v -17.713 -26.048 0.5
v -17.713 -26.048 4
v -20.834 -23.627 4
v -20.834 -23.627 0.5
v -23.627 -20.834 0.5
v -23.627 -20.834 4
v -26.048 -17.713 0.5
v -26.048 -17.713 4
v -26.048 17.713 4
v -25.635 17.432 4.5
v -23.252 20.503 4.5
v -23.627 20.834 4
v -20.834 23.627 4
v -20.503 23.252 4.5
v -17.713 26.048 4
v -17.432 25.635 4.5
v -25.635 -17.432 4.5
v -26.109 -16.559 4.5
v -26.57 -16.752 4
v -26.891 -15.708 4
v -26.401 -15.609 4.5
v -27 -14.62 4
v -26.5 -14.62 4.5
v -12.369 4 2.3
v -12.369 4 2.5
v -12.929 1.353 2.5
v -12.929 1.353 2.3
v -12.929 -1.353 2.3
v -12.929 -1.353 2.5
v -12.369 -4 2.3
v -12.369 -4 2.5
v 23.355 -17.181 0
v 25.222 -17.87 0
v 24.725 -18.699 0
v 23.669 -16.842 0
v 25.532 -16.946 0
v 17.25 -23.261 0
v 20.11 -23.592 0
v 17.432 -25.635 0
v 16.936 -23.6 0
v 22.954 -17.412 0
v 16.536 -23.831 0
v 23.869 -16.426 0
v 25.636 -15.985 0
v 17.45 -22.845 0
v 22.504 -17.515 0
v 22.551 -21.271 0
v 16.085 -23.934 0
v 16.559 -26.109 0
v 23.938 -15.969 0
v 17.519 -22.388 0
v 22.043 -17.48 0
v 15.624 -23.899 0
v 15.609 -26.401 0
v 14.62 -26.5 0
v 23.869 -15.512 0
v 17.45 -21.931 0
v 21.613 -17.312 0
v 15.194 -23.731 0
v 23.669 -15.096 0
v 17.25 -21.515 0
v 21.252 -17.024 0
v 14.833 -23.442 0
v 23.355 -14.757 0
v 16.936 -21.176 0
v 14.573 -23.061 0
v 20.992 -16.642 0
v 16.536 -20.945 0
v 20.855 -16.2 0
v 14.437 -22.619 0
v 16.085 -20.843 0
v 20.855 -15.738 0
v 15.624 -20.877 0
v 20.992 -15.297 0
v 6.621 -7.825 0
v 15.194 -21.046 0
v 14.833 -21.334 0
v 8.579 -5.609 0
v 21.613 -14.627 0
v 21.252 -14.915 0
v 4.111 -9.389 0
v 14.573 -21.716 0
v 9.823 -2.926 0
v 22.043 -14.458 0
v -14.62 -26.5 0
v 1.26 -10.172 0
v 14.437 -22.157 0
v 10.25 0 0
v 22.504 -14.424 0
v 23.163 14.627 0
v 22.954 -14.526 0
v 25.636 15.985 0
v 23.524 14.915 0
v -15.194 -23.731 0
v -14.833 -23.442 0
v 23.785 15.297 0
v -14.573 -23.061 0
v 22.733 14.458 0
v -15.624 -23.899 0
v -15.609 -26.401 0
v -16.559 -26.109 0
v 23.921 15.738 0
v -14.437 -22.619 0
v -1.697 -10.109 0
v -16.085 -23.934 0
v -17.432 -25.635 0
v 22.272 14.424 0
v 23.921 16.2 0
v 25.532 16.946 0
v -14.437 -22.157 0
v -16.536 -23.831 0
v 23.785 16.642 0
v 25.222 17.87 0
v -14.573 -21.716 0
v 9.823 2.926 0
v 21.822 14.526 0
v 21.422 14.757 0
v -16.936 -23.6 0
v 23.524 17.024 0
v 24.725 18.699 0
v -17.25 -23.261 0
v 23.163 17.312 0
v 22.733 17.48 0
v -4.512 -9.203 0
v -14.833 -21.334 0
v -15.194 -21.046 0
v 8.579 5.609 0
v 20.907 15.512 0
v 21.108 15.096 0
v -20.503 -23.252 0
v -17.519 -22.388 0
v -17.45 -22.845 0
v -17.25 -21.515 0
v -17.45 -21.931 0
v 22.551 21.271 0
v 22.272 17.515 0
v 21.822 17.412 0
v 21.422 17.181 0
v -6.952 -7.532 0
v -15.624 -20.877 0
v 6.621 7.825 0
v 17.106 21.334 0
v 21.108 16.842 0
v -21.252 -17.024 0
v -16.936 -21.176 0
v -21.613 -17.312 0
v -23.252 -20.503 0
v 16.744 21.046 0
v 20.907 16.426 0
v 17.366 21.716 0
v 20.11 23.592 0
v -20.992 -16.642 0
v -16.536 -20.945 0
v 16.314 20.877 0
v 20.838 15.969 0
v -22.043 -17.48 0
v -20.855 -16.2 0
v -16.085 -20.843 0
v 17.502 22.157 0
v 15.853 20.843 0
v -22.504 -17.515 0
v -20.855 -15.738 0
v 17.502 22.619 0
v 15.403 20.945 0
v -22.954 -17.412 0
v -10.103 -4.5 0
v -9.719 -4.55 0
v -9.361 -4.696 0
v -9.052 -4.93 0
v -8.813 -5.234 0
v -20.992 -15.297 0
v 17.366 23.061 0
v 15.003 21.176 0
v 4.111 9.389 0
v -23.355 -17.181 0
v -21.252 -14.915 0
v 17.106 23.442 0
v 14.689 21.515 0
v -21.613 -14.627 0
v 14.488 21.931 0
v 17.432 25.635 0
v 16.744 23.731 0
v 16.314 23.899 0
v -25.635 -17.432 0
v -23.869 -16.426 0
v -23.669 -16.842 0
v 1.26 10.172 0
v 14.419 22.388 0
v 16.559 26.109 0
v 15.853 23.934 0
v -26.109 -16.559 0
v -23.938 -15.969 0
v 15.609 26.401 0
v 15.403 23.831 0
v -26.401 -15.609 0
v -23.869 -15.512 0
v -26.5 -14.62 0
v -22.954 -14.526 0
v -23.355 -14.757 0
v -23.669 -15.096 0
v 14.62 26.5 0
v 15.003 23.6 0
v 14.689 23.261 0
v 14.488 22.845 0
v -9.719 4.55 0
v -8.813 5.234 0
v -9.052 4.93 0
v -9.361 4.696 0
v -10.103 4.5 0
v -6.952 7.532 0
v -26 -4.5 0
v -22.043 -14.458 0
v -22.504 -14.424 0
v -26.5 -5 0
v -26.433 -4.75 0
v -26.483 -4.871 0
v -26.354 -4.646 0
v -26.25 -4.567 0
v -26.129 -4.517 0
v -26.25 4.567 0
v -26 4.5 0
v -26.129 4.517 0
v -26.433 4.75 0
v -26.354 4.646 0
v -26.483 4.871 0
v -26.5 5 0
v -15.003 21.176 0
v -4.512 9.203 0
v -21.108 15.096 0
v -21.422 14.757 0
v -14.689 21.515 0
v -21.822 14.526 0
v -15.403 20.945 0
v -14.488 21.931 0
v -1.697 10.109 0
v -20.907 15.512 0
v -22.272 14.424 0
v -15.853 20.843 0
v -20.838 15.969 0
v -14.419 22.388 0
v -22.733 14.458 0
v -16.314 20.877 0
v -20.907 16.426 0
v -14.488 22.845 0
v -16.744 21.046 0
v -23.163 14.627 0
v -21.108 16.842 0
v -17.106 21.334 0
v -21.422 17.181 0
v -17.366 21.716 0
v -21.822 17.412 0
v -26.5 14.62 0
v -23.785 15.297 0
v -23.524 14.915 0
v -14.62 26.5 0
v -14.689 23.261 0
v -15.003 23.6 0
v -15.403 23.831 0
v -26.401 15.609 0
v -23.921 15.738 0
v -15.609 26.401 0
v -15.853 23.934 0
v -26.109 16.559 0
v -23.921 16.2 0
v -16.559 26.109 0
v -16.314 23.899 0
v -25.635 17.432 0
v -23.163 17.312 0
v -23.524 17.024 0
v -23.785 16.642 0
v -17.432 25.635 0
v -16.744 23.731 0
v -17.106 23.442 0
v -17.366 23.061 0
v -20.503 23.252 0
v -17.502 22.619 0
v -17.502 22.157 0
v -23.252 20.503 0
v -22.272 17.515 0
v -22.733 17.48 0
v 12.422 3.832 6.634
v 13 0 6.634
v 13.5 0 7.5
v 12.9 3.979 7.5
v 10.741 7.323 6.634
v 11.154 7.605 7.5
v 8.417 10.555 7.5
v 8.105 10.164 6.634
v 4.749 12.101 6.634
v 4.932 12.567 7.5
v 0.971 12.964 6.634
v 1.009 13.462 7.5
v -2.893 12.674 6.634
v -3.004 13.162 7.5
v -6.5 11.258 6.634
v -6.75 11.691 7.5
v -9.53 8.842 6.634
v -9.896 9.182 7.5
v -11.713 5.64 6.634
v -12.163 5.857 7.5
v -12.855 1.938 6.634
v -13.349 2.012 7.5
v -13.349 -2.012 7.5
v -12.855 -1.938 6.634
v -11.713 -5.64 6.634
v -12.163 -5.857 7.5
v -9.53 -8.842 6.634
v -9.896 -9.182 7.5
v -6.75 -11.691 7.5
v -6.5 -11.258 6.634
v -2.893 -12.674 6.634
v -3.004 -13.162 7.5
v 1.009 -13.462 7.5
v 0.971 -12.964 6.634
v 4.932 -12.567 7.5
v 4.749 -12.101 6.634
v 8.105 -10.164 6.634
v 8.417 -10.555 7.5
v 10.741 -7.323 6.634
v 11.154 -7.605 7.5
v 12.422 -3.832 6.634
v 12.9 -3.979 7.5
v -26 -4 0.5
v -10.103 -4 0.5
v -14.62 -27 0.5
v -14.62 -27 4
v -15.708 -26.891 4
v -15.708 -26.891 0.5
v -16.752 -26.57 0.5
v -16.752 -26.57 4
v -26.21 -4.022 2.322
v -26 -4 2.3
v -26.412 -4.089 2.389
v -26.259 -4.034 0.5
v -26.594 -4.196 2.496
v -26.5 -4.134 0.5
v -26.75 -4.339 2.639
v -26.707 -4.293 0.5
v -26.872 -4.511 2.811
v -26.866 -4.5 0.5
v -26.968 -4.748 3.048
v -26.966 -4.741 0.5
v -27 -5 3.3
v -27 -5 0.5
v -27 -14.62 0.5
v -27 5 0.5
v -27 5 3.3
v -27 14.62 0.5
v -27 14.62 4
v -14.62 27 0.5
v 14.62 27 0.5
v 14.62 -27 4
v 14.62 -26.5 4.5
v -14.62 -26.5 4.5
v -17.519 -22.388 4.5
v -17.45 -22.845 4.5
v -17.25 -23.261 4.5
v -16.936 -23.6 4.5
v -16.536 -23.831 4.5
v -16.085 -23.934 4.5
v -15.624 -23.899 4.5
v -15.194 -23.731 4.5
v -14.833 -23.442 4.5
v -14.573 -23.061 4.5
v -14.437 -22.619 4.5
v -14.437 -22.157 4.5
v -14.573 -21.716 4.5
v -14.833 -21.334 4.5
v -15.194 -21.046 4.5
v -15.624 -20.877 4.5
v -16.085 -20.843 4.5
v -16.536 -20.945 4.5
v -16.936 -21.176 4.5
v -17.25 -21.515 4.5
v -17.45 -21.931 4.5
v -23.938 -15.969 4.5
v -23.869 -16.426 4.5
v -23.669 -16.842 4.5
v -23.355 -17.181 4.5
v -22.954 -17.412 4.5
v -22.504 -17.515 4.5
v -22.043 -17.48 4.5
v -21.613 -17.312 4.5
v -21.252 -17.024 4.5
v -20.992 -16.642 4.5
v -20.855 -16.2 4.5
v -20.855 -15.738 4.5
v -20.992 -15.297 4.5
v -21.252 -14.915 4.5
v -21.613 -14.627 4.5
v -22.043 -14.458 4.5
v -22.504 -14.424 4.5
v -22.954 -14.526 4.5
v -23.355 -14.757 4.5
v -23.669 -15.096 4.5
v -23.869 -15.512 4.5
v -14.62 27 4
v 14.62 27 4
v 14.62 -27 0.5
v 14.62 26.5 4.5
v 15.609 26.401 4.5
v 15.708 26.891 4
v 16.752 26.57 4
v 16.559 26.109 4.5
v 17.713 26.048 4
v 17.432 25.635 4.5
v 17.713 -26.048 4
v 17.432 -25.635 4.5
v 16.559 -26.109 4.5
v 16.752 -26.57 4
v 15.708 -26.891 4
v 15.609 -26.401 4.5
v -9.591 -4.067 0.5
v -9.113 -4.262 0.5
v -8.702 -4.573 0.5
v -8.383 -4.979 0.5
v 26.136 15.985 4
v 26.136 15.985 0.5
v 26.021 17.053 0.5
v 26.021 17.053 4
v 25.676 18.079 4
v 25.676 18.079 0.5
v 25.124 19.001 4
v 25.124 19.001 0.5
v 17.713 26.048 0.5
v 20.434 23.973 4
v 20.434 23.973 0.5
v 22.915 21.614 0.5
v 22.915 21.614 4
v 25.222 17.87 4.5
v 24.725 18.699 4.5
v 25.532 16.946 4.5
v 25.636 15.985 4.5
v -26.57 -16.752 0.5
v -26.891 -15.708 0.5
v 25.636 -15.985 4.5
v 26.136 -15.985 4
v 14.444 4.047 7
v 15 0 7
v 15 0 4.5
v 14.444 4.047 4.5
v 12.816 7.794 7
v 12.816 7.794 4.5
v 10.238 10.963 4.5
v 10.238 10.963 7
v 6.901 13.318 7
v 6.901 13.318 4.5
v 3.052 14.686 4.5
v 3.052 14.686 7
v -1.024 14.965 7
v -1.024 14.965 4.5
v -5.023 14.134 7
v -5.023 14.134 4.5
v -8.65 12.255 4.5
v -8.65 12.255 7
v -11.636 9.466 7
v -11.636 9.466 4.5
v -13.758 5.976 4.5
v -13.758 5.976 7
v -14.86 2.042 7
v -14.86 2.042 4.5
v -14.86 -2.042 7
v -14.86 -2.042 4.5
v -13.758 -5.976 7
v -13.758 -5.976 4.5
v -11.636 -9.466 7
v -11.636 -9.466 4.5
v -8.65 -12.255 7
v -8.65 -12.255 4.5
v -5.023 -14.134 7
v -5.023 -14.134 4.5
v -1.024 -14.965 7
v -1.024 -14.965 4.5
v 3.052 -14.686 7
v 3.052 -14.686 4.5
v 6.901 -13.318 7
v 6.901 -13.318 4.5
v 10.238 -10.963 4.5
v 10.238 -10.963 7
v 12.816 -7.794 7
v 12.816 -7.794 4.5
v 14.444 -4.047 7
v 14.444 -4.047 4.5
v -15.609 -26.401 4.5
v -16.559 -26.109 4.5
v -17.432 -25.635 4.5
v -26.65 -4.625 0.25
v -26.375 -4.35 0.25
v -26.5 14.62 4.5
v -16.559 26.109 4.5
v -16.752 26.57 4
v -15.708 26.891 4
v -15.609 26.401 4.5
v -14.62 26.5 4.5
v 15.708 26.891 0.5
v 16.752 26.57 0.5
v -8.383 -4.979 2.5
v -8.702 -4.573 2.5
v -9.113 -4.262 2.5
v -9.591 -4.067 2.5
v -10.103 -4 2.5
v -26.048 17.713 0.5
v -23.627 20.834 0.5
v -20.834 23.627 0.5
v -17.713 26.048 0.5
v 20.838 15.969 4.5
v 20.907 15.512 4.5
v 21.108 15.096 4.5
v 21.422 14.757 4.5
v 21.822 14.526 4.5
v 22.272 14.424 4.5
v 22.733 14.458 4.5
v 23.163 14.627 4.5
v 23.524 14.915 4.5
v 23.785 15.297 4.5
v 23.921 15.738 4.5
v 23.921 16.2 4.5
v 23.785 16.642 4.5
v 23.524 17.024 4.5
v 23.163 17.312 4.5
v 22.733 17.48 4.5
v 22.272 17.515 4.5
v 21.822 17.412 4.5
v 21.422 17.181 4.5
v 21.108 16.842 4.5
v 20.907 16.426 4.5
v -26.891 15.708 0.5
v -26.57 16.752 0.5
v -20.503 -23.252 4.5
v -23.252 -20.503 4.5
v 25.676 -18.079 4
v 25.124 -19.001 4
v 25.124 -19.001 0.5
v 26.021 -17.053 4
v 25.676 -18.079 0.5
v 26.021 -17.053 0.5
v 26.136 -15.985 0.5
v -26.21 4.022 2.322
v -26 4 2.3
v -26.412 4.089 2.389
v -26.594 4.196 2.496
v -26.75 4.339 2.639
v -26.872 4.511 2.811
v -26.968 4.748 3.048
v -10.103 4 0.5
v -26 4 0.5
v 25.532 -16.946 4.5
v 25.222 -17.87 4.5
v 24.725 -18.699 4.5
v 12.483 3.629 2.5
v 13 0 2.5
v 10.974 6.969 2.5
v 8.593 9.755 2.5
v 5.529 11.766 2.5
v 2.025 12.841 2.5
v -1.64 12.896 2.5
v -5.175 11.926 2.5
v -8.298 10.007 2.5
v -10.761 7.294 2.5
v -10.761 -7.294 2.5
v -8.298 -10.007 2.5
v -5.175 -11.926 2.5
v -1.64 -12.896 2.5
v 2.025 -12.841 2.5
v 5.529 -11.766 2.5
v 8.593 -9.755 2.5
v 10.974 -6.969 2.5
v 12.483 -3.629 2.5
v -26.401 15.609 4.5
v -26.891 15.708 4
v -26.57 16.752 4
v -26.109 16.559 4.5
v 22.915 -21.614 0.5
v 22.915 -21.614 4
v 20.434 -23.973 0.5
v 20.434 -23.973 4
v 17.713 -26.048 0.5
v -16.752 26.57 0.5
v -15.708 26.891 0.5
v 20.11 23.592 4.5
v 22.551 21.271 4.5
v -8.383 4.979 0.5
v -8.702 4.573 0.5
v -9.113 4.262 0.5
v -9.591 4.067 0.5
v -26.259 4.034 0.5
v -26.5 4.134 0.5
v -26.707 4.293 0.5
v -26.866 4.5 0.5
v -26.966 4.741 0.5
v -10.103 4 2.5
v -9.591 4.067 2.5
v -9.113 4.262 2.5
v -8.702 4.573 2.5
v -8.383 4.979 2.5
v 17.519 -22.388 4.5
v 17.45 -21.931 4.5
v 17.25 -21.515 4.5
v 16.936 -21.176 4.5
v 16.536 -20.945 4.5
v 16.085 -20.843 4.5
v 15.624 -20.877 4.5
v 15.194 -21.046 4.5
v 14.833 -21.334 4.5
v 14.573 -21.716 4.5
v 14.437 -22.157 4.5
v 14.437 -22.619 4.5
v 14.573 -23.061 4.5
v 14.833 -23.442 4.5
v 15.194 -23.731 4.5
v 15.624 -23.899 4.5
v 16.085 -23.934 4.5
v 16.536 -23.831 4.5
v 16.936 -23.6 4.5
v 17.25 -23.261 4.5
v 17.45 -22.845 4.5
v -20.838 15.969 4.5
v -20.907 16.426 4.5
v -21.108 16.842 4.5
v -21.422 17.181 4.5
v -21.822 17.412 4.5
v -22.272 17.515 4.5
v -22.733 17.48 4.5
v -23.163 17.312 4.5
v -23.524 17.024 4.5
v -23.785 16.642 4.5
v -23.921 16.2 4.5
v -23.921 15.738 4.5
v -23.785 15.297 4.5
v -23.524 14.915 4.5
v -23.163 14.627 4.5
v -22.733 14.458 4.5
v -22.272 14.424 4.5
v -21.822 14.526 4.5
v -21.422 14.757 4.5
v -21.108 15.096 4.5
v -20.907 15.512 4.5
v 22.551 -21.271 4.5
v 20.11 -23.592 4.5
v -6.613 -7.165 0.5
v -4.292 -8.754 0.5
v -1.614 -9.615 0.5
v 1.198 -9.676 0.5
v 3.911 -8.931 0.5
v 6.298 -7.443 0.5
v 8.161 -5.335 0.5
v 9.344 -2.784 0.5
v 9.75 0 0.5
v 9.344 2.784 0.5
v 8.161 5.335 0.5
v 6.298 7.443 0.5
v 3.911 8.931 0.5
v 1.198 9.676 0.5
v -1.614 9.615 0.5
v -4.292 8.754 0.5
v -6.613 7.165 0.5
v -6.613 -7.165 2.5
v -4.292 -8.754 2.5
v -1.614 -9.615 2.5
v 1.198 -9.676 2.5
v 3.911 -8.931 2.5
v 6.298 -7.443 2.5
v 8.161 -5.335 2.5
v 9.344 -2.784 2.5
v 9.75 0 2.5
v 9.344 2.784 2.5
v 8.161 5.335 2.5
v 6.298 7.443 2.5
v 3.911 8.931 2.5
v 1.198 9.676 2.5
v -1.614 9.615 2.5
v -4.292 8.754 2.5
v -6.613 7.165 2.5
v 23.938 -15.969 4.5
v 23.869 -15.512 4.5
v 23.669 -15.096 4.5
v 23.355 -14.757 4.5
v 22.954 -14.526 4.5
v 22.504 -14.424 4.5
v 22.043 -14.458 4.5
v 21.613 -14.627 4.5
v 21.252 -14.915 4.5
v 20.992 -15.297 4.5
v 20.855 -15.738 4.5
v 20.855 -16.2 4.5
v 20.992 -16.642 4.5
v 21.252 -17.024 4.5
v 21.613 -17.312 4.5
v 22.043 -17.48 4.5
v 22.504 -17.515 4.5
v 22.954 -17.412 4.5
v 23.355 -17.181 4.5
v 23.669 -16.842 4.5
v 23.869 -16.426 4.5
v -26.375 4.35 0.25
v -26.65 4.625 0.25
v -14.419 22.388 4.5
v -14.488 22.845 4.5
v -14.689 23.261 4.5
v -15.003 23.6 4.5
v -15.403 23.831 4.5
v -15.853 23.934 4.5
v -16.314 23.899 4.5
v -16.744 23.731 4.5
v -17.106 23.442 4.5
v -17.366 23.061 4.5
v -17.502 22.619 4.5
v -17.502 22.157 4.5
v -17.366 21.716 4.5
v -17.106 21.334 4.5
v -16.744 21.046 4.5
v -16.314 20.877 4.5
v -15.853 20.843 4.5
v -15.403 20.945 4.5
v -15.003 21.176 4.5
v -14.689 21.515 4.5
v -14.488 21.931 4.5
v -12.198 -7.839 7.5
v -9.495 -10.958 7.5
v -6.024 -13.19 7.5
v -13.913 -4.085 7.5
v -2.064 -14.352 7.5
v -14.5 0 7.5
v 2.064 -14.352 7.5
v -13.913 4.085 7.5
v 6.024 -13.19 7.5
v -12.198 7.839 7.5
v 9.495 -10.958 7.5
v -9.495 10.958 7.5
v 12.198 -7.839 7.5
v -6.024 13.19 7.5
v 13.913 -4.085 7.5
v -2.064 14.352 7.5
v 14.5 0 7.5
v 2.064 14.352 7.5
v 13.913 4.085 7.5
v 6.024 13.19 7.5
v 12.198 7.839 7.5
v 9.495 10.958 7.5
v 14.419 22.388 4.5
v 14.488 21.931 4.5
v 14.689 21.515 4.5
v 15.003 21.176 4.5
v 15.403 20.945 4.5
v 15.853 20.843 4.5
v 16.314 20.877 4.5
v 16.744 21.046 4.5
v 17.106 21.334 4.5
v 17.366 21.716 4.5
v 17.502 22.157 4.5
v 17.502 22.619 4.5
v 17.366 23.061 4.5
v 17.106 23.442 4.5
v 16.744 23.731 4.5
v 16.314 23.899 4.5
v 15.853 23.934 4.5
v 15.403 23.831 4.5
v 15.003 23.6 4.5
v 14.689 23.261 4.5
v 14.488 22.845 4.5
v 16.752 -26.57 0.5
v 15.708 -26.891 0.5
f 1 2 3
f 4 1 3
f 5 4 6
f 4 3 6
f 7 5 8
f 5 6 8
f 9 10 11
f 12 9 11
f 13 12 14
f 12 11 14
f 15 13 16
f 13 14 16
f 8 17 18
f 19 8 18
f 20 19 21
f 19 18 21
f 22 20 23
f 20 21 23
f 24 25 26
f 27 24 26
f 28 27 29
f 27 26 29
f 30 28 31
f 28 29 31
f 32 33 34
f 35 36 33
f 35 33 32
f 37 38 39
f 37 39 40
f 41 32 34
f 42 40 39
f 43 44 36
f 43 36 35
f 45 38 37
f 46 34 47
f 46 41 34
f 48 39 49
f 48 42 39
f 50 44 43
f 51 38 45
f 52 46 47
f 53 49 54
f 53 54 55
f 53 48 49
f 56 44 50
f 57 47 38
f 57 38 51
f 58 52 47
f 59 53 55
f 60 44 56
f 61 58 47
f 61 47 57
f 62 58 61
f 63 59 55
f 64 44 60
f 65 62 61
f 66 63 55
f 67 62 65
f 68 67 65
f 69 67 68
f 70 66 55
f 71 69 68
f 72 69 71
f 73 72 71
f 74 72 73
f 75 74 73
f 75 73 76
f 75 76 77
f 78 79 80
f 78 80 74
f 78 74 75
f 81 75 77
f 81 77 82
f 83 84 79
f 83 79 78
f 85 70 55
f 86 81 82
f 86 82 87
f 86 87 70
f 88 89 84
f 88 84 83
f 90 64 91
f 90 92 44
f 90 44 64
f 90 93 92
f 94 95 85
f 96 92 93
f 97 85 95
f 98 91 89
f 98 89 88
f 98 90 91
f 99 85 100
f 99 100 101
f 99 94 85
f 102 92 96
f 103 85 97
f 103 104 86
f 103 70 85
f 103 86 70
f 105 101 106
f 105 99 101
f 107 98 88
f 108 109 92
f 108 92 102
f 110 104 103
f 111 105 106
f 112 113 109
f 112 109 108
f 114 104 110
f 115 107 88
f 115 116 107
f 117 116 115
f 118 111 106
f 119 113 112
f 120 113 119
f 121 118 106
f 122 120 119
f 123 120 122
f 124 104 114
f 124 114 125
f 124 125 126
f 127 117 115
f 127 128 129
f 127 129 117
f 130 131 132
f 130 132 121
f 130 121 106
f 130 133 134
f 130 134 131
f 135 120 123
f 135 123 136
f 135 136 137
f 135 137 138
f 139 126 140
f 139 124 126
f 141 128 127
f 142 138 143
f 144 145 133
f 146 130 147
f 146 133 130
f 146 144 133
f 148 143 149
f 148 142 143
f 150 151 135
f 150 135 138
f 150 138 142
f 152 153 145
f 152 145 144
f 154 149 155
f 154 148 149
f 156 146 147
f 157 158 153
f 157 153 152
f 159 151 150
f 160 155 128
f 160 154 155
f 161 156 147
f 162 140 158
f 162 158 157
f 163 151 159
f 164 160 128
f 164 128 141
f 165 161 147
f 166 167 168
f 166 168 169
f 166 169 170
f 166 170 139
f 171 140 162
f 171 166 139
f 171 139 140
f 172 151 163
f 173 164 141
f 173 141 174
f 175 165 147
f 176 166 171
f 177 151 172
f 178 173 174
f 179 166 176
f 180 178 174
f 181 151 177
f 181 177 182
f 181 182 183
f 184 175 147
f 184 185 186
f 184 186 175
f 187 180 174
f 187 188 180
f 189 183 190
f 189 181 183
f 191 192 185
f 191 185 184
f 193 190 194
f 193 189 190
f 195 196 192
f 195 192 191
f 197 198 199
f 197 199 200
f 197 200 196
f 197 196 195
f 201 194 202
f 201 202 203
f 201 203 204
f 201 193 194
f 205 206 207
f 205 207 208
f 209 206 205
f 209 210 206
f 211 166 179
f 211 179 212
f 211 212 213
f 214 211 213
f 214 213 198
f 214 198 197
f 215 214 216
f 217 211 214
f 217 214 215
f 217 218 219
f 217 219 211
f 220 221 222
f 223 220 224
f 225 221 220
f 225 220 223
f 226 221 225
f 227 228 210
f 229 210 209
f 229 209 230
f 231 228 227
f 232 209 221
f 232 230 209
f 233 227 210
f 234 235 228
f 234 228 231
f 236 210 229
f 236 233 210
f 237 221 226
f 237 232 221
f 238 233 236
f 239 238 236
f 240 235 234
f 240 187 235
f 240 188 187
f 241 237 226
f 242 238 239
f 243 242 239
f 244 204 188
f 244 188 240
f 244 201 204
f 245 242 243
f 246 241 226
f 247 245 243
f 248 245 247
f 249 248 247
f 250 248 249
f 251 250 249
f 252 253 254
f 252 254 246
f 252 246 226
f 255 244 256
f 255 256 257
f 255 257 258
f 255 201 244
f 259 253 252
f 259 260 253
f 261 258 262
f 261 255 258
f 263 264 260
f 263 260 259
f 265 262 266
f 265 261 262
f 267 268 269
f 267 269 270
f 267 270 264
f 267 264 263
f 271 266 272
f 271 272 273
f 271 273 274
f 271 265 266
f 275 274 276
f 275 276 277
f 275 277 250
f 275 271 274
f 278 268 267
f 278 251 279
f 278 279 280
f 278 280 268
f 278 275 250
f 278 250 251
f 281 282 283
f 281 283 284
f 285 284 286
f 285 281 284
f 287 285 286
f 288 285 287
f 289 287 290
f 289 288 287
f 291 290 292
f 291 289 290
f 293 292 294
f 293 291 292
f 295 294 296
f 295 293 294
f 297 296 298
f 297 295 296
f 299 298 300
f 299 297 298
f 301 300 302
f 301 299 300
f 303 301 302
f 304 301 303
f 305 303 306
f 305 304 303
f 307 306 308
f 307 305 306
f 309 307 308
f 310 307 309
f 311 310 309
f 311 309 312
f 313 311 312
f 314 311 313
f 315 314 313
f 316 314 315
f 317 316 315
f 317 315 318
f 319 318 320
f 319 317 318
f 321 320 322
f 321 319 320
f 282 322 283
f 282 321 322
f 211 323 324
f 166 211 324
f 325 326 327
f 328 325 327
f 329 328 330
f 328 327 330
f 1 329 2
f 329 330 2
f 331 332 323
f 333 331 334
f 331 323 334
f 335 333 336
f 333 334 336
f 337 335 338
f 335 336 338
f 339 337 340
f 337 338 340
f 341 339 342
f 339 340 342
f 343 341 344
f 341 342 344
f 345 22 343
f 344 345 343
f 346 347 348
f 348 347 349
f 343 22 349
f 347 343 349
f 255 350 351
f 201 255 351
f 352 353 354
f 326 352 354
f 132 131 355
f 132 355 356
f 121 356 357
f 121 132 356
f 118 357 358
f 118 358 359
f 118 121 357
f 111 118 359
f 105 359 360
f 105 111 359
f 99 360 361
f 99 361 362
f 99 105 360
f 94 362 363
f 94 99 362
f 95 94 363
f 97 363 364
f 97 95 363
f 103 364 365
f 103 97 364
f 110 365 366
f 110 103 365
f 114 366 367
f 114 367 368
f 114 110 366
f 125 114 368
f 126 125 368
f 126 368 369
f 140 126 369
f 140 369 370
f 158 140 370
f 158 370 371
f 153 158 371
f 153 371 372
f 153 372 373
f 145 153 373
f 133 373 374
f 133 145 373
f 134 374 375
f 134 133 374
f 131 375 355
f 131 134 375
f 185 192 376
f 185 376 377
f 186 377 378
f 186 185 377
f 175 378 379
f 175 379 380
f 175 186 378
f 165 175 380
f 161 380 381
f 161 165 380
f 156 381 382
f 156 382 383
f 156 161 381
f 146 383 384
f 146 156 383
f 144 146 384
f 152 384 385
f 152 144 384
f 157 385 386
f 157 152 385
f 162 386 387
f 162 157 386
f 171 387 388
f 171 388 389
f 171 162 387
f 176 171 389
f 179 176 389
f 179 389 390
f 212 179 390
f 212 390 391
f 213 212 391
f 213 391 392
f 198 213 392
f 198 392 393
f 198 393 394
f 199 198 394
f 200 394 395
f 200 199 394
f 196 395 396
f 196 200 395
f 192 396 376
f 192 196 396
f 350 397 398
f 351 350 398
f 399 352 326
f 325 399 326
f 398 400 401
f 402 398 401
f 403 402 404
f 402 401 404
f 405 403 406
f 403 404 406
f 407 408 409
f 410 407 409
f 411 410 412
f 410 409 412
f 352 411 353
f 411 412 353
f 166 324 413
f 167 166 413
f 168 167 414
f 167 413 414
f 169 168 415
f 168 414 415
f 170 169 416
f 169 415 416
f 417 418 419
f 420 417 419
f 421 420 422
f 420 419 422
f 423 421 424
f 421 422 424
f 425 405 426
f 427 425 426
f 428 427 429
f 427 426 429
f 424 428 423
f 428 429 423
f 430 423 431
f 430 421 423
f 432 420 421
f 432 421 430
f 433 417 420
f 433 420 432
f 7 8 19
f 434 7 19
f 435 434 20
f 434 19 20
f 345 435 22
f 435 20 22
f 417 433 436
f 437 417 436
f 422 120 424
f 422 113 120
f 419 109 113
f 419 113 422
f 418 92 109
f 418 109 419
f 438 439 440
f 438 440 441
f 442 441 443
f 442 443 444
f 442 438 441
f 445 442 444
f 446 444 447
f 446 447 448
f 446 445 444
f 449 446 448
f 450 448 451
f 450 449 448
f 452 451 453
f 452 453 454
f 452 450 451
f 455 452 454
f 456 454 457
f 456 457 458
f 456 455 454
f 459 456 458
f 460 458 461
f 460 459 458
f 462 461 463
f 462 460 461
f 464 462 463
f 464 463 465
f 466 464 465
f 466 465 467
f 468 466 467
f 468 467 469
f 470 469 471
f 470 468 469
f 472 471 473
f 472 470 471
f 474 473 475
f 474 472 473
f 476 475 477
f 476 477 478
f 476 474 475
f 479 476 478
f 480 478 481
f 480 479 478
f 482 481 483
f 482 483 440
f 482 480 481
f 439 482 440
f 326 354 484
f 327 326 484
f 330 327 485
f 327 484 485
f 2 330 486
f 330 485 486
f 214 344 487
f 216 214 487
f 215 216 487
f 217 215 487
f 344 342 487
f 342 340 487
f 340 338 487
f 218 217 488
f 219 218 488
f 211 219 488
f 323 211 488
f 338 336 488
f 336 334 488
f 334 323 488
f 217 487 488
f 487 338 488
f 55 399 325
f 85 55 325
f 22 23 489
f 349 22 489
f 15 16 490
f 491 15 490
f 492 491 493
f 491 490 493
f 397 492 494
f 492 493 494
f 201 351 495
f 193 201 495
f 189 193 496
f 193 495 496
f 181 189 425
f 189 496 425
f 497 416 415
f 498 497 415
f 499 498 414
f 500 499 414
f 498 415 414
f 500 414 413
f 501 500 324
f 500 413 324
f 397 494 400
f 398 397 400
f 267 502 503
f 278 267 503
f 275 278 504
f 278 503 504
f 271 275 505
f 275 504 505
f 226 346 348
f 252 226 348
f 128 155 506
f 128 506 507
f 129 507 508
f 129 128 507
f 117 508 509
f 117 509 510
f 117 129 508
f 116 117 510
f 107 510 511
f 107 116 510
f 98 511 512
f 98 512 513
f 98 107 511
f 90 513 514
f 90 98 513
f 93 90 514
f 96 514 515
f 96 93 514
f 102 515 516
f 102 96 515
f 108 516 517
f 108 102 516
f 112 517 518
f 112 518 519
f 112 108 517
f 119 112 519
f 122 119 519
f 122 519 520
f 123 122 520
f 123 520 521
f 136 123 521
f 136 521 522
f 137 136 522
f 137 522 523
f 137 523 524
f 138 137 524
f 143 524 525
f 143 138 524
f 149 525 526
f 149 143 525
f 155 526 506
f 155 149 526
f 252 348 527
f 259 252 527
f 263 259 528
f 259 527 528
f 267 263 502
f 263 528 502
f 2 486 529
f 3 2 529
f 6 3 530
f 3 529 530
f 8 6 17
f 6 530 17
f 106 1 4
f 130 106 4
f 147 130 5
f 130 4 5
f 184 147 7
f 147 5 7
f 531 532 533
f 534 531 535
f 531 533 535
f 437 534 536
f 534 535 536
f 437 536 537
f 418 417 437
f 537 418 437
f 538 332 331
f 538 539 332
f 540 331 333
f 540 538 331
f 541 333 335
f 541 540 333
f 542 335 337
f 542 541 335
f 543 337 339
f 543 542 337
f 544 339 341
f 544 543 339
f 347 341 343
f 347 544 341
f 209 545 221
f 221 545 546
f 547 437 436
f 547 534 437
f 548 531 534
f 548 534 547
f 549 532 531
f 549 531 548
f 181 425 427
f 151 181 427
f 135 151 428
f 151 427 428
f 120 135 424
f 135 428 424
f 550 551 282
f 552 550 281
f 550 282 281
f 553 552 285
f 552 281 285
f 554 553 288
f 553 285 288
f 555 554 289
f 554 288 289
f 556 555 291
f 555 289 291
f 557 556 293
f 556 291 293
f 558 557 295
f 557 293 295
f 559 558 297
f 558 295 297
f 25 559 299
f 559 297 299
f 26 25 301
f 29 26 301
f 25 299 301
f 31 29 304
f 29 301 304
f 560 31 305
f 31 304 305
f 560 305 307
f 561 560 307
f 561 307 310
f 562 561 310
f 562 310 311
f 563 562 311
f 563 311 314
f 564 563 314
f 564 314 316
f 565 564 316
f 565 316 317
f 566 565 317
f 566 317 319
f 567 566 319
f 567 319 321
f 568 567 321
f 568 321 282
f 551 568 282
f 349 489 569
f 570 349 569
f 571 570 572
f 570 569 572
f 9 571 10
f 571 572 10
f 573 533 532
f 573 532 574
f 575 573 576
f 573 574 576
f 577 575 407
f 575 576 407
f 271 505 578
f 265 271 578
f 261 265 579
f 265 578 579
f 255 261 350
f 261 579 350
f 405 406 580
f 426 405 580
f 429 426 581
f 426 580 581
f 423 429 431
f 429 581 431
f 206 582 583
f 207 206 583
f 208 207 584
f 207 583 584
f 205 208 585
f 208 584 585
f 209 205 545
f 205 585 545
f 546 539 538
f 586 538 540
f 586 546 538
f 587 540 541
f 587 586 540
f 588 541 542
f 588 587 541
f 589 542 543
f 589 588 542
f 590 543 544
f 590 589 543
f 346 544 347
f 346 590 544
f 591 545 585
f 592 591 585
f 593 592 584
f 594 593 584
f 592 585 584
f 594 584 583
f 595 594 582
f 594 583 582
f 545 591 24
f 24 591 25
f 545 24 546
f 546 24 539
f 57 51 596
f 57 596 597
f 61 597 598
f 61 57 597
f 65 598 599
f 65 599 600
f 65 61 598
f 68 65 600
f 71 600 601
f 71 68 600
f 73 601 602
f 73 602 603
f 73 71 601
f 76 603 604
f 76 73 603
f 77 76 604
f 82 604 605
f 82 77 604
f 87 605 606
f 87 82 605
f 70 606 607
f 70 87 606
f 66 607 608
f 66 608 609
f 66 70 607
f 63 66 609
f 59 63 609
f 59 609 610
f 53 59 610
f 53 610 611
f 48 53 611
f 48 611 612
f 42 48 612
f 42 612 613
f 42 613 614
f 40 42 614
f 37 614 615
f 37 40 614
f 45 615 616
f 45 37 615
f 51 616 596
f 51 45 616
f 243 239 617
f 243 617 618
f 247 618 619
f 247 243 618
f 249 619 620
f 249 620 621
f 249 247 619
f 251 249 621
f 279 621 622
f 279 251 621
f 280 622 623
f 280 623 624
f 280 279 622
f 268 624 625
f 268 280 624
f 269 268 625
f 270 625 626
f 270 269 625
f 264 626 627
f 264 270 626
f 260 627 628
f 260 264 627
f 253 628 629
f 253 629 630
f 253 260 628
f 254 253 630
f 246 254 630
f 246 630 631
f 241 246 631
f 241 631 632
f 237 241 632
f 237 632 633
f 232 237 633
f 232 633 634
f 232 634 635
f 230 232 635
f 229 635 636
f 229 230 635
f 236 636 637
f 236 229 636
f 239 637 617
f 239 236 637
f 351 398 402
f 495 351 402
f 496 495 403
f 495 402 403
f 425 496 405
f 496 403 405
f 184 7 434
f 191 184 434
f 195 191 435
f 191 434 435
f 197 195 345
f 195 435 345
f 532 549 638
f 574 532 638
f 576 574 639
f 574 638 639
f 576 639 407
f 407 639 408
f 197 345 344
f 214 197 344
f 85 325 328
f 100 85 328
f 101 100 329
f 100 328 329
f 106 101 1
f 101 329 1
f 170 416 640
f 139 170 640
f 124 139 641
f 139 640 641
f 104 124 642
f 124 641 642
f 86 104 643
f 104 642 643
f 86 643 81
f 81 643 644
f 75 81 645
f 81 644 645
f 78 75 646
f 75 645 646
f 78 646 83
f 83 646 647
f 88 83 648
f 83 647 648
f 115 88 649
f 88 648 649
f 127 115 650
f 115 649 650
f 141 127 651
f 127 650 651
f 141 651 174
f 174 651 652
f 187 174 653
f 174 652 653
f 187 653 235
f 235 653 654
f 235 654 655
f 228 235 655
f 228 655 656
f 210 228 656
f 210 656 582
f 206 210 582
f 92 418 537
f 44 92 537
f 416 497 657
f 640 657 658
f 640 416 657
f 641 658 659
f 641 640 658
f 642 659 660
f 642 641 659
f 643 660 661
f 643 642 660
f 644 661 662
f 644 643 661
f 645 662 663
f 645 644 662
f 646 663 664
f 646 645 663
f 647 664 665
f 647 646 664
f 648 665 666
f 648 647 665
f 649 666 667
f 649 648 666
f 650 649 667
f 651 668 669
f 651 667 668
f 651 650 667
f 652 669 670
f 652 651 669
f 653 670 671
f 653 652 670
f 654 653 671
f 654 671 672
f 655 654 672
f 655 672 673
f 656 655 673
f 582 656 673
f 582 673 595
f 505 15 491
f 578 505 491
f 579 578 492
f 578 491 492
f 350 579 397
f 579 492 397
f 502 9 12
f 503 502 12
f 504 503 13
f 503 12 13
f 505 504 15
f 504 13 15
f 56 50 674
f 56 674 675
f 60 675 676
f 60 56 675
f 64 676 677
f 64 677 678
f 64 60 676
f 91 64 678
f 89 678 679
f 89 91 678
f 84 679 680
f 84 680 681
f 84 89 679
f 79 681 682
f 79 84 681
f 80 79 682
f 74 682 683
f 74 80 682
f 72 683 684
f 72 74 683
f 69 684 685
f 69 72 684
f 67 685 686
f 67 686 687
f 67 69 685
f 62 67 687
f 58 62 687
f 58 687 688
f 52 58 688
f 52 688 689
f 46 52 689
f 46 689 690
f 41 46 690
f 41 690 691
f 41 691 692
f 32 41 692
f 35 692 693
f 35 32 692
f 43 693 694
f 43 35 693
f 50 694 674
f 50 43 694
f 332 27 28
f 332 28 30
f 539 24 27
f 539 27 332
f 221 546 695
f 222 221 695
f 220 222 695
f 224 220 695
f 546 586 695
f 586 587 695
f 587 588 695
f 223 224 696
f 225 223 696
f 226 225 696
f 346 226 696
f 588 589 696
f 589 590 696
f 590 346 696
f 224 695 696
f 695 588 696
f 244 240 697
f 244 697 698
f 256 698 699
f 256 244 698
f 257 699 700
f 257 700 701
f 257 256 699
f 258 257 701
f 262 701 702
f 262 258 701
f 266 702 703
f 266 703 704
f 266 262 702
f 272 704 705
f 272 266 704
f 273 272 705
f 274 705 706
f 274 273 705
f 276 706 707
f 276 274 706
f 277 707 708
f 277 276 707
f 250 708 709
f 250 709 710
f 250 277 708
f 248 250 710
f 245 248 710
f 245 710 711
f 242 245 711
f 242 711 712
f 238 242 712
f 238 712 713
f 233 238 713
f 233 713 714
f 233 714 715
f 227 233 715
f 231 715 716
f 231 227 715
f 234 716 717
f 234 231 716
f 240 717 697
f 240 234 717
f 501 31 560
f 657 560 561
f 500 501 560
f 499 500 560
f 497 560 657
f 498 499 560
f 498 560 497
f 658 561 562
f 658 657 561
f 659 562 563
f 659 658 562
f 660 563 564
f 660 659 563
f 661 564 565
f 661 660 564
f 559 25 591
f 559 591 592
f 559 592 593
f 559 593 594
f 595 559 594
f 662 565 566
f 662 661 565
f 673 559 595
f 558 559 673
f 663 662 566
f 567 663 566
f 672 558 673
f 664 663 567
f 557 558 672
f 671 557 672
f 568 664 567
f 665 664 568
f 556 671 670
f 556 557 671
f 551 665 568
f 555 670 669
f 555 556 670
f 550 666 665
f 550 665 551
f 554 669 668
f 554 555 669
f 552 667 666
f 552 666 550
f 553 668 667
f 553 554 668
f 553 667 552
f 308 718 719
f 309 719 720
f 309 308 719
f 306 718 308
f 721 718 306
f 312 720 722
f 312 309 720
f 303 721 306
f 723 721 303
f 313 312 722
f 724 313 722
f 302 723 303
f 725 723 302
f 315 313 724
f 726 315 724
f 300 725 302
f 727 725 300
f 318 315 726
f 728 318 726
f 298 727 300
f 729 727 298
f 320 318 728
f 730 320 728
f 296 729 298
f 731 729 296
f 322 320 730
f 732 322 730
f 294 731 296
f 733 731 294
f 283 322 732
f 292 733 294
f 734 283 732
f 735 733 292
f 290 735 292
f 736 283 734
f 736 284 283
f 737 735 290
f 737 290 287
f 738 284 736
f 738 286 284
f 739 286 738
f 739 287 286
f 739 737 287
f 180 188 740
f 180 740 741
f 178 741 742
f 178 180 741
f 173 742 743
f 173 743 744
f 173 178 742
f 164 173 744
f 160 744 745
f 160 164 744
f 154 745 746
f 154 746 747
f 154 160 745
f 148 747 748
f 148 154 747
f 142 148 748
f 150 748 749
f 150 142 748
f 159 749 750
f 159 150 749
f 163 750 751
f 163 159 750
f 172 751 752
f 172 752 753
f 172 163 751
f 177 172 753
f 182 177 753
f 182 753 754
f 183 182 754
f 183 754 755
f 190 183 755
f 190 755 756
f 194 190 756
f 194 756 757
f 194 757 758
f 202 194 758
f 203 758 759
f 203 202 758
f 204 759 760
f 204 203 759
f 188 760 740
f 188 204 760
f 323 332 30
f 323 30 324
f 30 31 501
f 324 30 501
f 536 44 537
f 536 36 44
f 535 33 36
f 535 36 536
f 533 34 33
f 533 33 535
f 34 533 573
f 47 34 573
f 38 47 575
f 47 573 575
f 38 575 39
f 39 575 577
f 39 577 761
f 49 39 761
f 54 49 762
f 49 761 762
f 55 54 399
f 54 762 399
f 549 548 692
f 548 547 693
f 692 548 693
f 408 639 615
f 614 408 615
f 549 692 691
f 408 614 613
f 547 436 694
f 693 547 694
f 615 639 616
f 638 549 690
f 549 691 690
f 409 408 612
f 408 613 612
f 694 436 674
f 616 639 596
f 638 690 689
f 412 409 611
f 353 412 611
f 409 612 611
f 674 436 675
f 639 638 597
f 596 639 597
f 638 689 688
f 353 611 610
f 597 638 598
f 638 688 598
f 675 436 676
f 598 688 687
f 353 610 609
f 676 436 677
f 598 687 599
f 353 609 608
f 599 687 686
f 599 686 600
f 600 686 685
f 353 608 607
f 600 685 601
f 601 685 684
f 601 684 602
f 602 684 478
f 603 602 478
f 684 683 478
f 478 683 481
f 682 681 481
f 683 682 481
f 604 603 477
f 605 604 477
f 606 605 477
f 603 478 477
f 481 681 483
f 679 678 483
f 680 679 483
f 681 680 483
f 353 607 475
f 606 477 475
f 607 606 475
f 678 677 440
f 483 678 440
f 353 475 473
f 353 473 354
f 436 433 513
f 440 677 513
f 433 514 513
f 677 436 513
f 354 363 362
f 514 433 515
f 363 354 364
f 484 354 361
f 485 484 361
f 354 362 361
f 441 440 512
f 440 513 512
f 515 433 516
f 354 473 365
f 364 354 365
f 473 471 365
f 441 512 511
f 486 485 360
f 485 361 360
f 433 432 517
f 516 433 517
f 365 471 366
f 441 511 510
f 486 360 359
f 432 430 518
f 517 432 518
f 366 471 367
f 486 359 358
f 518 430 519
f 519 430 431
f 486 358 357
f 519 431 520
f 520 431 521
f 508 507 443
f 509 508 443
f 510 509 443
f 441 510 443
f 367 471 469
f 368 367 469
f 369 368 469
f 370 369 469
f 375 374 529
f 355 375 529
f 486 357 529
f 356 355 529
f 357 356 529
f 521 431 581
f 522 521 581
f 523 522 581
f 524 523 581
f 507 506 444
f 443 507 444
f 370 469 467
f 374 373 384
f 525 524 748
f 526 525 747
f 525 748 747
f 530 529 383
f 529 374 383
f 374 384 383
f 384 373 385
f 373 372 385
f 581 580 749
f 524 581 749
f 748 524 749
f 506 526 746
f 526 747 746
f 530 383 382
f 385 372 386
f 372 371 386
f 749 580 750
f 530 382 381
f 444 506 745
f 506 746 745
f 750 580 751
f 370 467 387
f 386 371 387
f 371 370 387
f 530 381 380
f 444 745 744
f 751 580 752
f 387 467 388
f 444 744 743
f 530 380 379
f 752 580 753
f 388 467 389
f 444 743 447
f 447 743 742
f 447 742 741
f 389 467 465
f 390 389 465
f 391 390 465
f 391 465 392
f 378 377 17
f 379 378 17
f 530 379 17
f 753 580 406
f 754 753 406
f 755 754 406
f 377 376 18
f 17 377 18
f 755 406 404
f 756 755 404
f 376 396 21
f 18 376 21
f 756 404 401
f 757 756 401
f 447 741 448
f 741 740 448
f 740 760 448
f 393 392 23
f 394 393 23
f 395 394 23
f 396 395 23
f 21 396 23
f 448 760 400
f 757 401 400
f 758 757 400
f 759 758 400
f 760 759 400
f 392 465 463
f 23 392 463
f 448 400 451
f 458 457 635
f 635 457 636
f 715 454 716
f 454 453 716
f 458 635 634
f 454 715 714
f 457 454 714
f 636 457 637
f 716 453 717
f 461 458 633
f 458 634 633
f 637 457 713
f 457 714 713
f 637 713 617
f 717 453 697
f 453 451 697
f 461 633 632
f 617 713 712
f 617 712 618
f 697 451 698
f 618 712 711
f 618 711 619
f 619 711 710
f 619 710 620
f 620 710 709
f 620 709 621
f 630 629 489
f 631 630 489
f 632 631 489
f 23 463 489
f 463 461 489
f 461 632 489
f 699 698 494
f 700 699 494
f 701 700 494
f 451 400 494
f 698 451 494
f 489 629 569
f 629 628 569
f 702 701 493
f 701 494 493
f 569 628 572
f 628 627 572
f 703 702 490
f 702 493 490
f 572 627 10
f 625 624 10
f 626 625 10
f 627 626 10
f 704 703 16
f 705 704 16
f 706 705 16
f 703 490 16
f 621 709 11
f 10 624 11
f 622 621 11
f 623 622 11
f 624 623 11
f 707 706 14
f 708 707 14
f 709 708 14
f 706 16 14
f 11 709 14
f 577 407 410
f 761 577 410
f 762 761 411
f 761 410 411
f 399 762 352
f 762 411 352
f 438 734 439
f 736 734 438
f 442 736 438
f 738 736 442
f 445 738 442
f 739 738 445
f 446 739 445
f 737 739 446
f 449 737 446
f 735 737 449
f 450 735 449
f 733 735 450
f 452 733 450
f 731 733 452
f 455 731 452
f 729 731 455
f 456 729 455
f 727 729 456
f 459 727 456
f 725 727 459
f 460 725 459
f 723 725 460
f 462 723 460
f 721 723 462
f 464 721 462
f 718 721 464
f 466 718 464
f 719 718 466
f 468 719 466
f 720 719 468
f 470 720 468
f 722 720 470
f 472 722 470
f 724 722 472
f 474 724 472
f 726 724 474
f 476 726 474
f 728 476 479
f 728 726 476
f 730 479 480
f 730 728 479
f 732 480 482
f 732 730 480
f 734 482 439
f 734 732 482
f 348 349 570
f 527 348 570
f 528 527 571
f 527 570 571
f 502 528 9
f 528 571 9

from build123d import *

# Parameters (mm, degrees)
SKETCH_2_W               = 51
SKETCH_2_H               = 51
SKETCH_2_R               = 1.55
EXTRUDE_1_DEPTH          = 4.5
CUT_EXTRUDE_1_DEPTH      = 5
FILLET_1_R               = 4
SKETCH_5_R               = 13
CUT_EXTRUDE_2_DEPTH      = 2
CUT_EXTRUDE_3_DEPTH      = 37.14899722
CUT_EXTRUDE_3_DEPTH_BACK = 37.14899722
SKETCH_6_R               = 9.75
CUT_EXTRUDE_4_DEPTH      = 37.342124319
CUT_EXTRUDE_4_DEPTH_BACK = 2.3
SKETCH_8_W               = 28
SKETCH_8_H               = 8
EXTRUDE_START            = -4.5
EXTRUDE_2_DEPTH          = 4.5
CUT_EXTRUDE_7_DEPTH      = 39.448016854
CUT_EXTRUDE_7_DEPTH_BACK = 2.3
SKETCH_11_W              = 1.5
SKETCH_11_H              = 8
FILLET_3_R               = 1
FILLET_4_R               = 5
EXTRUDE_START_2          = 3
SKETCH_12_R              = 15
SKETCH_12_R_2            = 13
EXTRUDE_3_DEPTH          = 3
CUT_EXTRUDE_START        = -0.2
CUT_EXTRUDE_8_DEPTH      = 0.2
FILLET_5_R               = 2
CHAMFER_1_SIZE           = 0.5
CHAMFER_2_SIZE           = 0.5
CHAMFER_2_SIZE2          = 0.866025404


with BuildPart() as part:
    # 草图2 → 凸台-拉伸1 (new body)
    with BuildSketch(Plane.XY):
        Rectangle(SKETCH_2_W, SKETCH_2_H)
        with Locations((-22.388176755, 15.969331282)):
            Circle(SKETCH_2_R, mode=Mode.SUBTRACT)
        with Locations((-15.969331282, 22.388176755)):
            Circle(SKETCH_2_R, mode=Mode.SUBTRACT)
        with Locations(Location((15.969331282, 22.388176755, 0), (0, 0, 180))):
            Circle(SKETCH_2_R, mode=Mode.SUBTRACT)
        with Locations(Location((22.388176755, 15.969331282, 0), (0, 0, 180))):
            Circle(SKETCH_2_R, mode=Mode.SUBTRACT)
        with Locations((22.388176755, -15.969331282)):
            Circle(SKETCH_2_R, mode=Mode.SUBTRACT)
        with Locations((15.969331282, -22.388176755)):
            Circle(SKETCH_2_R, mode=Mode.SUBTRACT)
        with Locations(Location((-15.969331282, -22.388176755, 0), (0, 0, 180))):
            Circle(SKETCH_2_R, mode=Mode.SUBTRACT)
        with Locations(Location((-22.388176755, -15.969331282, 0), (0, 0, 180))):
            Circle(SKETCH_2_R, mode=Mode.SUBTRACT)
    extrude(amount=EXTRUDE_1_DEPTH)

    # 草图4 → 切除-拉伸1 (cut)
    with BuildSketch(Plane.XY.offset(4.5)):
        with BuildLine():
            Line((-25.5, -15.803480629), (-25.5, -25.5))
            Line((-25.5, -25.5), (-15.803480629, -25.5))
            ThreePointArc((-15.803480629, -25.5), (-21.213203436, -21.213203436), (-25.5, -15.803480629))
        make_face()
        with BuildLine():
            Line((15.803480629, -25.5), (25.5, -25.5))
            Line((25.5, -25.5), (25.5, -15.803480629))
            ThreePointArc((25.5, -15.803480629), (21.213203436, -21.213203436), (15.803480629, -25.5))
        make_face()
        with BuildLine():
            Line((25.5, 15.803480629), (25.5, 25.5))
            Line((25.5, 25.5), (15.803480629, 25.5))
            ThreePointArc((15.803480629, 25.5), (21.213203436, 21.213203436), (25.5, 15.803480629))
        make_face()
        with BuildLine():
            Line((-15.803480629, 25.5), (-25.5, 25.5))
            Line((-25.5, 25.5), (-25.5, 15.803480629))
            ThreePointArc((-25.5, 15.803480629), (-21.213203436, 21.213203436), (-15.803480629, 25.5))
        make_face()
    extrude(amount=-CUT_EXTRUDE_1_DEPTH, mode=Mode.SUBTRACT)

    # 圆角1
    fillet_1_edges = [part.edges().sort_by_distance(p)[0] for p in [
        (-15.803480629, -25.5, 2.25),
        (15.803480629, -25.5, 2.25),
        (-25.5, 15.803480629, 2.25),
        (15.803480629, 25.5, 2.25),
        (-15.803480629, 25.5, 2.25),
        (25.5, 15.803480629, 2.25),
        (25.5, -15.803480629, 2.25),
        (-25.5, -15.803480629, 2.25),
    ]]
    fillet(fillet_1_edges, radius=FILLET_1_R)

    # 草图5 → 切除-拉伸2 (cut)
    with BuildSketch(Plane.XY.offset(4.5)):
        Circle(SKETCH_5_R)
    extrude(amount=-CUT_EXTRUDE_2_DEPTH, mode=Mode.SUBTRACT)

    # 草图6 → 切除-拉伸3 (cut, two sides: drawn at the far end of the back side and taken through both)
    with BuildSketch(Plane.XY.offset(2.5).offset(-CUT_EXTRUDE_3_DEPTH_BACK)):
        Circle(SKETCH_6_R)
    extrude(amount=CUT_EXTRUDE_3_DEPTH + CUT_EXTRUDE_3_DEPTH_BACK, mode=Mode.SUBTRACT)

    # 草图8 → 切除-拉伸4 (cut, two sides: drawn at the far end of the back side and taken through both)
    with BuildSketch(Plane(origin=(0, 0, 0), x_dir=(-1, 0, 0), z_dir=(0, 0, -1)).offset(-CUT_EXTRUDE_4_DEPTH_BACK)):
        with Locations((22.891709622, 0)):
            Rectangle(SKETCH_8_W, SKETCH_8_H)
    extrude(amount=CUT_EXTRUDE_4_DEPTH + CUT_EXTRUDE_4_DEPTH_BACK, mode=Mode.SUBTRACT)

    # 草图9 → 凸台-拉伸2 (add)
    with BuildSketch(Plane(origin=(0, 0, 0), x_dir=(-1, 0, 0), z_dir=(0, 0, -1)).offset(EXTRUDE_START)):
        with BuildLine():
            ThreePointArc((-26.048076923, 17.712924338), (-26.09265794, 17.646326518), (-26.136263836, 17.579086183))
            Line((-26.136263836, 17.579086183), (-26.136263836, -17.579086183))
            ThreePointArc((-26.136263836, -17.579086183), (-26.09265794, -17.646326518), (-26.048076923, -17.712924338))
            ThreePointArc((-26.048076923, -17.712924338), (-22.273863607, -22.273863607), (-17.712924338, -26.048076923))
            ThreePointArc((-17.712924338, -26.048076923), (-16.238149632, -26.756635001), (-14.620191517, -27))
            Line((-14.620191517, -27), (14.620191517, -27))
            ThreePointArc((14.620191517, -27), (16.238149632, -26.756635001), (17.712924338, -26.048076923))
            ThreePointArc((17.712924338, -26.048076923), (22.273863607, -22.273863607), (26.048076923, -17.712924338))
            ThreePointArc((26.048076923, -17.712924338), (26.756635001, -16.238149632), (27, -14.620191517))
            Line((27, -14.620191517), (27, 14.620191517))
            ThreePointArc((27, 14.620191517), (26.756635001, 16.238149632), (26.048076923, 17.712924338))
            ThreePointArc((26.048076923, 17.712924338), (22.273863607, 22.273863607), (17.712924338, 26.048076923))
            ThreePointArc((17.712924338, 26.048076923), (16.238149632, 26.756635001), (14.620191517, 27))
            Line((14.620191517, 27), (-14.620191517, 27))
            ThreePointArc((-14.620191517, 27), (-16.238149632, 26.756635001), (-17.712924338, 26.048076923))
            ThreePointArc((-17.712924338, 26.048076923), (-22.273863607, 22.273863607), (-26.048076923, 17.712924338))
        make_face()
        with BuildLine():
            Line((25.5, 14.620191517), (25.5, 5))
            Line((25.5, 5), (25.5, 4))
            Line((25.5, 4), (25.5, -4))
            Line((25.5, -4), (25.5, -14.620191517))
            ThreePointArc((25.5, -14.620191517), (25.323007274, -15.796888328), (24.807692308, -16.869451751))
            ThreePointArc((24.807692308, -16.869451751), (21.213203436, -21.213203436), (16.869451751, -24.807692308))
            ThreePointArc((16.869451751, -24.807692308), (15.796888328, -25.323007274), (14.620191517, -25.5))
            Line((14.620191517, -25.5), (-14.620191517, -25.5))
            ThreePointArc((-14.620191517, -25.5), (-15.796888328, -25.323007274), (-16.869451751, -24.807692308))
            ThreePointArc((-16.869451751, -24.807692308), (-21.213203436, -21.213203436), (-24.807692308, -16.869451751))
            ThreePointArc((-24.807692308, -16.869451751), (-25.323007274, -15.796888328), (-25.5, -14.620191517))
            Line((-25.5, -14.620191517), (-25.5, 14.620191517))
            ThreePointArc((-25.5, 14.620191517), (-25.323007274, 15.796888328), (-24.807692308, 16.869451751))
            ThreePointArc((-24.807692308, 16.869451751), (-21.213203436, 21.213203436), (-16.869451751, 24.807692308))
            ThreePointArc((-16.869451751, 24.807692308), (-15.796888328, 25.323007274), (-14.620191517, 25.5))
            Line((-14.620191517, 25.5), (14.620191517, 25.5))
            ThreePointArc((14.620191517, 25.5), (15.796888328, 25.323007274), (16.869451751, 24.807692308))
            ThreePointArc((16.869451751, 24.807692308), (21.213203436, 21.213203436), (24.807692308, 16.869451751))
            ThreePointArc((24.807692308, 16.869451751), (25.323007274, 15.796888328), (25.5, 14.620191517))
        make_face(mode=Mode.SUBTRACT)
    extrude(amount=EXTRUDE_2_DEPTH)

    # 草图11 → 切除-拉伸7 (cut, two sides: drawn at the far end of the back side and taken through both)
    with BuildSketch(Plane(origin=(0, 0, 0), x_dir=(-1, 0, 0), z_dir=(0, 0, -1)).offset(-CUT_EXTRUDE_7_DEPTH_BACK)):
        with Locations((26.25, 0)):
            Rectangle(SKETCH_11_W, SKETCH_11_H)
    extrude(amount=CUT_EXTRUDE_7_DEPTH + CUT_EXTRUDE_7_DEPTH_BACK, mode=Mode.SUBTRACT)

    # 圆角3
    fillet_3_edges = [part.edges().sort_by_distance(p)[0] for p in [
        (-27, 4, 1.15),
        (-27, -4, 1.15),
        (-27, 0, 2.3),
    ]]
    fillet(fillet_3_edges, radius=FILLET_3_R)

    # 圆角4
    fillet_4_edges = [part.edges().sort_by_distance(p)[0] for p in [
        (26.136263836, 17.579086183, 2.25),
        (26.136263836, -17.579086183, 2.25),
    ]]
    fillet(fillet_4_edges, radius=FILLET_4_R)

    # 草图12 → 凸台-拉伸3 (add)
    with BuildSketch(Plane.XY.offset(4.5).offset(EXTRUDE_START_2)):
        Circle(SKETCH_12_R)
        Circle(SKETCH_12_R_2, mode=Mode.SUBTRACT)
    extrude(amount=-EXTRUDE_3_DEPTH)

    # 草图13 → 切除-拉伸8 (cut)
    with BuildSketch(Plane(origin=(0, 0, 2.3), x_dir=(-1, 0, 0), z_dir=(0, 0, -1)).offset(CUT_EXTRUDE_START)):
        with BuildLine():
            Line((8.891709622, 4), (12.369316877, 4))
            ThreePointArc((12.369316877, 4), (13, 0), (12.369316877, -4))
            Line((12.369316877, -4), (8.891709622, -4))
            ThreePointArc((8.891709622, -4), (9.75, 0), (8.891709622, 4))
        make_face()
    extrude(amount=CUT_EXTRUDE_8_DEPTH, mode=Mode.SUBTRACT)

    # 圆角5
    fillet_5_edges = [part.edges().sort_by_distance(p)[0] for p in [
        (-8.891709622, -4, 1.25),
        (-8.891709622, 4, 1.25),
    ]]
    fillet(fillet_5_edges, radius=FILLET_5_R)

    # 倒角1
    chamfer_1_edges = [part.edges().sort_by_distance(p)[0] for p in [
        (21.706505209, 22.827124909, 0),
        (16.238149632, -26.756635001, 0),
        (0, -27, 0),
        (-16.238149632, -26.756635001, 0),
        (-22.273863607, -22.273863607, 0),
        (-26.756635001, -16.238149632, 0),
        (-27, -9.810095759, 0),
        (-26.756635001, 16.238149632, 0),
        (-22.273863607, 22.273863607, 0),
        (-16.238149632, 26.756635001, 0),
        (0, 27, 0),
        (16.238149632, 26.756635001, 0),
        (16.238149632, -26.756635001, 4.5),
        (0, -27, 4.5),
        (-16.238149632, -26.756635001, 4.5),
        (-22.273863607, -22.273863607, 4.5),
        (-26.756635001, -16.238149632, 4.5),
        (-27, 0, 4.5),
        (-26.756635001, 16.238149632, 4.5),
        (-22.273863607, 22.273863607, 4.5),
        (-16.238149632, 26.756635001, 4.5),
        (0, 27, 4.5),
        (16.238149632, 26.756635001, 4.5),
        (21.706505209, 22.827124909, 4.5),
        (-27, 9.810095759, 0),
        (-18.051299338, 4, 0),
        (-26.707106781, 4.292893219, 0),
        (-26.707106781, -4.292893219, 0),
        (26.136263836, 0, 0),
        (21.706505209, -22.827124909, 0),
        (25.876510219, -17.575246148, 0),
        (25.876510219, 17.575246148, 0),
        (26.136263836, 0, 4.5),
        (21.706505209, -22.827124909, 4.5),
        (25.876510219, -17.575246148, 4.5),
        (25.876510219, 17.575246148, 4.5),
        (-15, 0, 7.5),
        (-18.051299338, -4, 0),
        (9.75, 0, 0),
        (-9.11329417, 4.26181802, 0),
        (-9.11329417, -4.26181802, 0),
    ]]
    chamfer(chamfer_1_edges, length=CHAMFER_1_SIZE)

    # 倒角2
    chamfer_2_edges = [part.edges().sort_by_distance(p)[0] for p in [
        (-13, 0, 7.5),
    ]]
    chamfer_2_side = [part.faces().sort_by_distance(p)[0] for p in [
        (-14.089878067, 0, 7.5),
    ]]
    chamfer(chamfer_2_edges, length=CHAMFER_2_SIZE, length2=CHAMFER_2_SIZE2, reference=chamfer_2_side[0])


solid = part.part
